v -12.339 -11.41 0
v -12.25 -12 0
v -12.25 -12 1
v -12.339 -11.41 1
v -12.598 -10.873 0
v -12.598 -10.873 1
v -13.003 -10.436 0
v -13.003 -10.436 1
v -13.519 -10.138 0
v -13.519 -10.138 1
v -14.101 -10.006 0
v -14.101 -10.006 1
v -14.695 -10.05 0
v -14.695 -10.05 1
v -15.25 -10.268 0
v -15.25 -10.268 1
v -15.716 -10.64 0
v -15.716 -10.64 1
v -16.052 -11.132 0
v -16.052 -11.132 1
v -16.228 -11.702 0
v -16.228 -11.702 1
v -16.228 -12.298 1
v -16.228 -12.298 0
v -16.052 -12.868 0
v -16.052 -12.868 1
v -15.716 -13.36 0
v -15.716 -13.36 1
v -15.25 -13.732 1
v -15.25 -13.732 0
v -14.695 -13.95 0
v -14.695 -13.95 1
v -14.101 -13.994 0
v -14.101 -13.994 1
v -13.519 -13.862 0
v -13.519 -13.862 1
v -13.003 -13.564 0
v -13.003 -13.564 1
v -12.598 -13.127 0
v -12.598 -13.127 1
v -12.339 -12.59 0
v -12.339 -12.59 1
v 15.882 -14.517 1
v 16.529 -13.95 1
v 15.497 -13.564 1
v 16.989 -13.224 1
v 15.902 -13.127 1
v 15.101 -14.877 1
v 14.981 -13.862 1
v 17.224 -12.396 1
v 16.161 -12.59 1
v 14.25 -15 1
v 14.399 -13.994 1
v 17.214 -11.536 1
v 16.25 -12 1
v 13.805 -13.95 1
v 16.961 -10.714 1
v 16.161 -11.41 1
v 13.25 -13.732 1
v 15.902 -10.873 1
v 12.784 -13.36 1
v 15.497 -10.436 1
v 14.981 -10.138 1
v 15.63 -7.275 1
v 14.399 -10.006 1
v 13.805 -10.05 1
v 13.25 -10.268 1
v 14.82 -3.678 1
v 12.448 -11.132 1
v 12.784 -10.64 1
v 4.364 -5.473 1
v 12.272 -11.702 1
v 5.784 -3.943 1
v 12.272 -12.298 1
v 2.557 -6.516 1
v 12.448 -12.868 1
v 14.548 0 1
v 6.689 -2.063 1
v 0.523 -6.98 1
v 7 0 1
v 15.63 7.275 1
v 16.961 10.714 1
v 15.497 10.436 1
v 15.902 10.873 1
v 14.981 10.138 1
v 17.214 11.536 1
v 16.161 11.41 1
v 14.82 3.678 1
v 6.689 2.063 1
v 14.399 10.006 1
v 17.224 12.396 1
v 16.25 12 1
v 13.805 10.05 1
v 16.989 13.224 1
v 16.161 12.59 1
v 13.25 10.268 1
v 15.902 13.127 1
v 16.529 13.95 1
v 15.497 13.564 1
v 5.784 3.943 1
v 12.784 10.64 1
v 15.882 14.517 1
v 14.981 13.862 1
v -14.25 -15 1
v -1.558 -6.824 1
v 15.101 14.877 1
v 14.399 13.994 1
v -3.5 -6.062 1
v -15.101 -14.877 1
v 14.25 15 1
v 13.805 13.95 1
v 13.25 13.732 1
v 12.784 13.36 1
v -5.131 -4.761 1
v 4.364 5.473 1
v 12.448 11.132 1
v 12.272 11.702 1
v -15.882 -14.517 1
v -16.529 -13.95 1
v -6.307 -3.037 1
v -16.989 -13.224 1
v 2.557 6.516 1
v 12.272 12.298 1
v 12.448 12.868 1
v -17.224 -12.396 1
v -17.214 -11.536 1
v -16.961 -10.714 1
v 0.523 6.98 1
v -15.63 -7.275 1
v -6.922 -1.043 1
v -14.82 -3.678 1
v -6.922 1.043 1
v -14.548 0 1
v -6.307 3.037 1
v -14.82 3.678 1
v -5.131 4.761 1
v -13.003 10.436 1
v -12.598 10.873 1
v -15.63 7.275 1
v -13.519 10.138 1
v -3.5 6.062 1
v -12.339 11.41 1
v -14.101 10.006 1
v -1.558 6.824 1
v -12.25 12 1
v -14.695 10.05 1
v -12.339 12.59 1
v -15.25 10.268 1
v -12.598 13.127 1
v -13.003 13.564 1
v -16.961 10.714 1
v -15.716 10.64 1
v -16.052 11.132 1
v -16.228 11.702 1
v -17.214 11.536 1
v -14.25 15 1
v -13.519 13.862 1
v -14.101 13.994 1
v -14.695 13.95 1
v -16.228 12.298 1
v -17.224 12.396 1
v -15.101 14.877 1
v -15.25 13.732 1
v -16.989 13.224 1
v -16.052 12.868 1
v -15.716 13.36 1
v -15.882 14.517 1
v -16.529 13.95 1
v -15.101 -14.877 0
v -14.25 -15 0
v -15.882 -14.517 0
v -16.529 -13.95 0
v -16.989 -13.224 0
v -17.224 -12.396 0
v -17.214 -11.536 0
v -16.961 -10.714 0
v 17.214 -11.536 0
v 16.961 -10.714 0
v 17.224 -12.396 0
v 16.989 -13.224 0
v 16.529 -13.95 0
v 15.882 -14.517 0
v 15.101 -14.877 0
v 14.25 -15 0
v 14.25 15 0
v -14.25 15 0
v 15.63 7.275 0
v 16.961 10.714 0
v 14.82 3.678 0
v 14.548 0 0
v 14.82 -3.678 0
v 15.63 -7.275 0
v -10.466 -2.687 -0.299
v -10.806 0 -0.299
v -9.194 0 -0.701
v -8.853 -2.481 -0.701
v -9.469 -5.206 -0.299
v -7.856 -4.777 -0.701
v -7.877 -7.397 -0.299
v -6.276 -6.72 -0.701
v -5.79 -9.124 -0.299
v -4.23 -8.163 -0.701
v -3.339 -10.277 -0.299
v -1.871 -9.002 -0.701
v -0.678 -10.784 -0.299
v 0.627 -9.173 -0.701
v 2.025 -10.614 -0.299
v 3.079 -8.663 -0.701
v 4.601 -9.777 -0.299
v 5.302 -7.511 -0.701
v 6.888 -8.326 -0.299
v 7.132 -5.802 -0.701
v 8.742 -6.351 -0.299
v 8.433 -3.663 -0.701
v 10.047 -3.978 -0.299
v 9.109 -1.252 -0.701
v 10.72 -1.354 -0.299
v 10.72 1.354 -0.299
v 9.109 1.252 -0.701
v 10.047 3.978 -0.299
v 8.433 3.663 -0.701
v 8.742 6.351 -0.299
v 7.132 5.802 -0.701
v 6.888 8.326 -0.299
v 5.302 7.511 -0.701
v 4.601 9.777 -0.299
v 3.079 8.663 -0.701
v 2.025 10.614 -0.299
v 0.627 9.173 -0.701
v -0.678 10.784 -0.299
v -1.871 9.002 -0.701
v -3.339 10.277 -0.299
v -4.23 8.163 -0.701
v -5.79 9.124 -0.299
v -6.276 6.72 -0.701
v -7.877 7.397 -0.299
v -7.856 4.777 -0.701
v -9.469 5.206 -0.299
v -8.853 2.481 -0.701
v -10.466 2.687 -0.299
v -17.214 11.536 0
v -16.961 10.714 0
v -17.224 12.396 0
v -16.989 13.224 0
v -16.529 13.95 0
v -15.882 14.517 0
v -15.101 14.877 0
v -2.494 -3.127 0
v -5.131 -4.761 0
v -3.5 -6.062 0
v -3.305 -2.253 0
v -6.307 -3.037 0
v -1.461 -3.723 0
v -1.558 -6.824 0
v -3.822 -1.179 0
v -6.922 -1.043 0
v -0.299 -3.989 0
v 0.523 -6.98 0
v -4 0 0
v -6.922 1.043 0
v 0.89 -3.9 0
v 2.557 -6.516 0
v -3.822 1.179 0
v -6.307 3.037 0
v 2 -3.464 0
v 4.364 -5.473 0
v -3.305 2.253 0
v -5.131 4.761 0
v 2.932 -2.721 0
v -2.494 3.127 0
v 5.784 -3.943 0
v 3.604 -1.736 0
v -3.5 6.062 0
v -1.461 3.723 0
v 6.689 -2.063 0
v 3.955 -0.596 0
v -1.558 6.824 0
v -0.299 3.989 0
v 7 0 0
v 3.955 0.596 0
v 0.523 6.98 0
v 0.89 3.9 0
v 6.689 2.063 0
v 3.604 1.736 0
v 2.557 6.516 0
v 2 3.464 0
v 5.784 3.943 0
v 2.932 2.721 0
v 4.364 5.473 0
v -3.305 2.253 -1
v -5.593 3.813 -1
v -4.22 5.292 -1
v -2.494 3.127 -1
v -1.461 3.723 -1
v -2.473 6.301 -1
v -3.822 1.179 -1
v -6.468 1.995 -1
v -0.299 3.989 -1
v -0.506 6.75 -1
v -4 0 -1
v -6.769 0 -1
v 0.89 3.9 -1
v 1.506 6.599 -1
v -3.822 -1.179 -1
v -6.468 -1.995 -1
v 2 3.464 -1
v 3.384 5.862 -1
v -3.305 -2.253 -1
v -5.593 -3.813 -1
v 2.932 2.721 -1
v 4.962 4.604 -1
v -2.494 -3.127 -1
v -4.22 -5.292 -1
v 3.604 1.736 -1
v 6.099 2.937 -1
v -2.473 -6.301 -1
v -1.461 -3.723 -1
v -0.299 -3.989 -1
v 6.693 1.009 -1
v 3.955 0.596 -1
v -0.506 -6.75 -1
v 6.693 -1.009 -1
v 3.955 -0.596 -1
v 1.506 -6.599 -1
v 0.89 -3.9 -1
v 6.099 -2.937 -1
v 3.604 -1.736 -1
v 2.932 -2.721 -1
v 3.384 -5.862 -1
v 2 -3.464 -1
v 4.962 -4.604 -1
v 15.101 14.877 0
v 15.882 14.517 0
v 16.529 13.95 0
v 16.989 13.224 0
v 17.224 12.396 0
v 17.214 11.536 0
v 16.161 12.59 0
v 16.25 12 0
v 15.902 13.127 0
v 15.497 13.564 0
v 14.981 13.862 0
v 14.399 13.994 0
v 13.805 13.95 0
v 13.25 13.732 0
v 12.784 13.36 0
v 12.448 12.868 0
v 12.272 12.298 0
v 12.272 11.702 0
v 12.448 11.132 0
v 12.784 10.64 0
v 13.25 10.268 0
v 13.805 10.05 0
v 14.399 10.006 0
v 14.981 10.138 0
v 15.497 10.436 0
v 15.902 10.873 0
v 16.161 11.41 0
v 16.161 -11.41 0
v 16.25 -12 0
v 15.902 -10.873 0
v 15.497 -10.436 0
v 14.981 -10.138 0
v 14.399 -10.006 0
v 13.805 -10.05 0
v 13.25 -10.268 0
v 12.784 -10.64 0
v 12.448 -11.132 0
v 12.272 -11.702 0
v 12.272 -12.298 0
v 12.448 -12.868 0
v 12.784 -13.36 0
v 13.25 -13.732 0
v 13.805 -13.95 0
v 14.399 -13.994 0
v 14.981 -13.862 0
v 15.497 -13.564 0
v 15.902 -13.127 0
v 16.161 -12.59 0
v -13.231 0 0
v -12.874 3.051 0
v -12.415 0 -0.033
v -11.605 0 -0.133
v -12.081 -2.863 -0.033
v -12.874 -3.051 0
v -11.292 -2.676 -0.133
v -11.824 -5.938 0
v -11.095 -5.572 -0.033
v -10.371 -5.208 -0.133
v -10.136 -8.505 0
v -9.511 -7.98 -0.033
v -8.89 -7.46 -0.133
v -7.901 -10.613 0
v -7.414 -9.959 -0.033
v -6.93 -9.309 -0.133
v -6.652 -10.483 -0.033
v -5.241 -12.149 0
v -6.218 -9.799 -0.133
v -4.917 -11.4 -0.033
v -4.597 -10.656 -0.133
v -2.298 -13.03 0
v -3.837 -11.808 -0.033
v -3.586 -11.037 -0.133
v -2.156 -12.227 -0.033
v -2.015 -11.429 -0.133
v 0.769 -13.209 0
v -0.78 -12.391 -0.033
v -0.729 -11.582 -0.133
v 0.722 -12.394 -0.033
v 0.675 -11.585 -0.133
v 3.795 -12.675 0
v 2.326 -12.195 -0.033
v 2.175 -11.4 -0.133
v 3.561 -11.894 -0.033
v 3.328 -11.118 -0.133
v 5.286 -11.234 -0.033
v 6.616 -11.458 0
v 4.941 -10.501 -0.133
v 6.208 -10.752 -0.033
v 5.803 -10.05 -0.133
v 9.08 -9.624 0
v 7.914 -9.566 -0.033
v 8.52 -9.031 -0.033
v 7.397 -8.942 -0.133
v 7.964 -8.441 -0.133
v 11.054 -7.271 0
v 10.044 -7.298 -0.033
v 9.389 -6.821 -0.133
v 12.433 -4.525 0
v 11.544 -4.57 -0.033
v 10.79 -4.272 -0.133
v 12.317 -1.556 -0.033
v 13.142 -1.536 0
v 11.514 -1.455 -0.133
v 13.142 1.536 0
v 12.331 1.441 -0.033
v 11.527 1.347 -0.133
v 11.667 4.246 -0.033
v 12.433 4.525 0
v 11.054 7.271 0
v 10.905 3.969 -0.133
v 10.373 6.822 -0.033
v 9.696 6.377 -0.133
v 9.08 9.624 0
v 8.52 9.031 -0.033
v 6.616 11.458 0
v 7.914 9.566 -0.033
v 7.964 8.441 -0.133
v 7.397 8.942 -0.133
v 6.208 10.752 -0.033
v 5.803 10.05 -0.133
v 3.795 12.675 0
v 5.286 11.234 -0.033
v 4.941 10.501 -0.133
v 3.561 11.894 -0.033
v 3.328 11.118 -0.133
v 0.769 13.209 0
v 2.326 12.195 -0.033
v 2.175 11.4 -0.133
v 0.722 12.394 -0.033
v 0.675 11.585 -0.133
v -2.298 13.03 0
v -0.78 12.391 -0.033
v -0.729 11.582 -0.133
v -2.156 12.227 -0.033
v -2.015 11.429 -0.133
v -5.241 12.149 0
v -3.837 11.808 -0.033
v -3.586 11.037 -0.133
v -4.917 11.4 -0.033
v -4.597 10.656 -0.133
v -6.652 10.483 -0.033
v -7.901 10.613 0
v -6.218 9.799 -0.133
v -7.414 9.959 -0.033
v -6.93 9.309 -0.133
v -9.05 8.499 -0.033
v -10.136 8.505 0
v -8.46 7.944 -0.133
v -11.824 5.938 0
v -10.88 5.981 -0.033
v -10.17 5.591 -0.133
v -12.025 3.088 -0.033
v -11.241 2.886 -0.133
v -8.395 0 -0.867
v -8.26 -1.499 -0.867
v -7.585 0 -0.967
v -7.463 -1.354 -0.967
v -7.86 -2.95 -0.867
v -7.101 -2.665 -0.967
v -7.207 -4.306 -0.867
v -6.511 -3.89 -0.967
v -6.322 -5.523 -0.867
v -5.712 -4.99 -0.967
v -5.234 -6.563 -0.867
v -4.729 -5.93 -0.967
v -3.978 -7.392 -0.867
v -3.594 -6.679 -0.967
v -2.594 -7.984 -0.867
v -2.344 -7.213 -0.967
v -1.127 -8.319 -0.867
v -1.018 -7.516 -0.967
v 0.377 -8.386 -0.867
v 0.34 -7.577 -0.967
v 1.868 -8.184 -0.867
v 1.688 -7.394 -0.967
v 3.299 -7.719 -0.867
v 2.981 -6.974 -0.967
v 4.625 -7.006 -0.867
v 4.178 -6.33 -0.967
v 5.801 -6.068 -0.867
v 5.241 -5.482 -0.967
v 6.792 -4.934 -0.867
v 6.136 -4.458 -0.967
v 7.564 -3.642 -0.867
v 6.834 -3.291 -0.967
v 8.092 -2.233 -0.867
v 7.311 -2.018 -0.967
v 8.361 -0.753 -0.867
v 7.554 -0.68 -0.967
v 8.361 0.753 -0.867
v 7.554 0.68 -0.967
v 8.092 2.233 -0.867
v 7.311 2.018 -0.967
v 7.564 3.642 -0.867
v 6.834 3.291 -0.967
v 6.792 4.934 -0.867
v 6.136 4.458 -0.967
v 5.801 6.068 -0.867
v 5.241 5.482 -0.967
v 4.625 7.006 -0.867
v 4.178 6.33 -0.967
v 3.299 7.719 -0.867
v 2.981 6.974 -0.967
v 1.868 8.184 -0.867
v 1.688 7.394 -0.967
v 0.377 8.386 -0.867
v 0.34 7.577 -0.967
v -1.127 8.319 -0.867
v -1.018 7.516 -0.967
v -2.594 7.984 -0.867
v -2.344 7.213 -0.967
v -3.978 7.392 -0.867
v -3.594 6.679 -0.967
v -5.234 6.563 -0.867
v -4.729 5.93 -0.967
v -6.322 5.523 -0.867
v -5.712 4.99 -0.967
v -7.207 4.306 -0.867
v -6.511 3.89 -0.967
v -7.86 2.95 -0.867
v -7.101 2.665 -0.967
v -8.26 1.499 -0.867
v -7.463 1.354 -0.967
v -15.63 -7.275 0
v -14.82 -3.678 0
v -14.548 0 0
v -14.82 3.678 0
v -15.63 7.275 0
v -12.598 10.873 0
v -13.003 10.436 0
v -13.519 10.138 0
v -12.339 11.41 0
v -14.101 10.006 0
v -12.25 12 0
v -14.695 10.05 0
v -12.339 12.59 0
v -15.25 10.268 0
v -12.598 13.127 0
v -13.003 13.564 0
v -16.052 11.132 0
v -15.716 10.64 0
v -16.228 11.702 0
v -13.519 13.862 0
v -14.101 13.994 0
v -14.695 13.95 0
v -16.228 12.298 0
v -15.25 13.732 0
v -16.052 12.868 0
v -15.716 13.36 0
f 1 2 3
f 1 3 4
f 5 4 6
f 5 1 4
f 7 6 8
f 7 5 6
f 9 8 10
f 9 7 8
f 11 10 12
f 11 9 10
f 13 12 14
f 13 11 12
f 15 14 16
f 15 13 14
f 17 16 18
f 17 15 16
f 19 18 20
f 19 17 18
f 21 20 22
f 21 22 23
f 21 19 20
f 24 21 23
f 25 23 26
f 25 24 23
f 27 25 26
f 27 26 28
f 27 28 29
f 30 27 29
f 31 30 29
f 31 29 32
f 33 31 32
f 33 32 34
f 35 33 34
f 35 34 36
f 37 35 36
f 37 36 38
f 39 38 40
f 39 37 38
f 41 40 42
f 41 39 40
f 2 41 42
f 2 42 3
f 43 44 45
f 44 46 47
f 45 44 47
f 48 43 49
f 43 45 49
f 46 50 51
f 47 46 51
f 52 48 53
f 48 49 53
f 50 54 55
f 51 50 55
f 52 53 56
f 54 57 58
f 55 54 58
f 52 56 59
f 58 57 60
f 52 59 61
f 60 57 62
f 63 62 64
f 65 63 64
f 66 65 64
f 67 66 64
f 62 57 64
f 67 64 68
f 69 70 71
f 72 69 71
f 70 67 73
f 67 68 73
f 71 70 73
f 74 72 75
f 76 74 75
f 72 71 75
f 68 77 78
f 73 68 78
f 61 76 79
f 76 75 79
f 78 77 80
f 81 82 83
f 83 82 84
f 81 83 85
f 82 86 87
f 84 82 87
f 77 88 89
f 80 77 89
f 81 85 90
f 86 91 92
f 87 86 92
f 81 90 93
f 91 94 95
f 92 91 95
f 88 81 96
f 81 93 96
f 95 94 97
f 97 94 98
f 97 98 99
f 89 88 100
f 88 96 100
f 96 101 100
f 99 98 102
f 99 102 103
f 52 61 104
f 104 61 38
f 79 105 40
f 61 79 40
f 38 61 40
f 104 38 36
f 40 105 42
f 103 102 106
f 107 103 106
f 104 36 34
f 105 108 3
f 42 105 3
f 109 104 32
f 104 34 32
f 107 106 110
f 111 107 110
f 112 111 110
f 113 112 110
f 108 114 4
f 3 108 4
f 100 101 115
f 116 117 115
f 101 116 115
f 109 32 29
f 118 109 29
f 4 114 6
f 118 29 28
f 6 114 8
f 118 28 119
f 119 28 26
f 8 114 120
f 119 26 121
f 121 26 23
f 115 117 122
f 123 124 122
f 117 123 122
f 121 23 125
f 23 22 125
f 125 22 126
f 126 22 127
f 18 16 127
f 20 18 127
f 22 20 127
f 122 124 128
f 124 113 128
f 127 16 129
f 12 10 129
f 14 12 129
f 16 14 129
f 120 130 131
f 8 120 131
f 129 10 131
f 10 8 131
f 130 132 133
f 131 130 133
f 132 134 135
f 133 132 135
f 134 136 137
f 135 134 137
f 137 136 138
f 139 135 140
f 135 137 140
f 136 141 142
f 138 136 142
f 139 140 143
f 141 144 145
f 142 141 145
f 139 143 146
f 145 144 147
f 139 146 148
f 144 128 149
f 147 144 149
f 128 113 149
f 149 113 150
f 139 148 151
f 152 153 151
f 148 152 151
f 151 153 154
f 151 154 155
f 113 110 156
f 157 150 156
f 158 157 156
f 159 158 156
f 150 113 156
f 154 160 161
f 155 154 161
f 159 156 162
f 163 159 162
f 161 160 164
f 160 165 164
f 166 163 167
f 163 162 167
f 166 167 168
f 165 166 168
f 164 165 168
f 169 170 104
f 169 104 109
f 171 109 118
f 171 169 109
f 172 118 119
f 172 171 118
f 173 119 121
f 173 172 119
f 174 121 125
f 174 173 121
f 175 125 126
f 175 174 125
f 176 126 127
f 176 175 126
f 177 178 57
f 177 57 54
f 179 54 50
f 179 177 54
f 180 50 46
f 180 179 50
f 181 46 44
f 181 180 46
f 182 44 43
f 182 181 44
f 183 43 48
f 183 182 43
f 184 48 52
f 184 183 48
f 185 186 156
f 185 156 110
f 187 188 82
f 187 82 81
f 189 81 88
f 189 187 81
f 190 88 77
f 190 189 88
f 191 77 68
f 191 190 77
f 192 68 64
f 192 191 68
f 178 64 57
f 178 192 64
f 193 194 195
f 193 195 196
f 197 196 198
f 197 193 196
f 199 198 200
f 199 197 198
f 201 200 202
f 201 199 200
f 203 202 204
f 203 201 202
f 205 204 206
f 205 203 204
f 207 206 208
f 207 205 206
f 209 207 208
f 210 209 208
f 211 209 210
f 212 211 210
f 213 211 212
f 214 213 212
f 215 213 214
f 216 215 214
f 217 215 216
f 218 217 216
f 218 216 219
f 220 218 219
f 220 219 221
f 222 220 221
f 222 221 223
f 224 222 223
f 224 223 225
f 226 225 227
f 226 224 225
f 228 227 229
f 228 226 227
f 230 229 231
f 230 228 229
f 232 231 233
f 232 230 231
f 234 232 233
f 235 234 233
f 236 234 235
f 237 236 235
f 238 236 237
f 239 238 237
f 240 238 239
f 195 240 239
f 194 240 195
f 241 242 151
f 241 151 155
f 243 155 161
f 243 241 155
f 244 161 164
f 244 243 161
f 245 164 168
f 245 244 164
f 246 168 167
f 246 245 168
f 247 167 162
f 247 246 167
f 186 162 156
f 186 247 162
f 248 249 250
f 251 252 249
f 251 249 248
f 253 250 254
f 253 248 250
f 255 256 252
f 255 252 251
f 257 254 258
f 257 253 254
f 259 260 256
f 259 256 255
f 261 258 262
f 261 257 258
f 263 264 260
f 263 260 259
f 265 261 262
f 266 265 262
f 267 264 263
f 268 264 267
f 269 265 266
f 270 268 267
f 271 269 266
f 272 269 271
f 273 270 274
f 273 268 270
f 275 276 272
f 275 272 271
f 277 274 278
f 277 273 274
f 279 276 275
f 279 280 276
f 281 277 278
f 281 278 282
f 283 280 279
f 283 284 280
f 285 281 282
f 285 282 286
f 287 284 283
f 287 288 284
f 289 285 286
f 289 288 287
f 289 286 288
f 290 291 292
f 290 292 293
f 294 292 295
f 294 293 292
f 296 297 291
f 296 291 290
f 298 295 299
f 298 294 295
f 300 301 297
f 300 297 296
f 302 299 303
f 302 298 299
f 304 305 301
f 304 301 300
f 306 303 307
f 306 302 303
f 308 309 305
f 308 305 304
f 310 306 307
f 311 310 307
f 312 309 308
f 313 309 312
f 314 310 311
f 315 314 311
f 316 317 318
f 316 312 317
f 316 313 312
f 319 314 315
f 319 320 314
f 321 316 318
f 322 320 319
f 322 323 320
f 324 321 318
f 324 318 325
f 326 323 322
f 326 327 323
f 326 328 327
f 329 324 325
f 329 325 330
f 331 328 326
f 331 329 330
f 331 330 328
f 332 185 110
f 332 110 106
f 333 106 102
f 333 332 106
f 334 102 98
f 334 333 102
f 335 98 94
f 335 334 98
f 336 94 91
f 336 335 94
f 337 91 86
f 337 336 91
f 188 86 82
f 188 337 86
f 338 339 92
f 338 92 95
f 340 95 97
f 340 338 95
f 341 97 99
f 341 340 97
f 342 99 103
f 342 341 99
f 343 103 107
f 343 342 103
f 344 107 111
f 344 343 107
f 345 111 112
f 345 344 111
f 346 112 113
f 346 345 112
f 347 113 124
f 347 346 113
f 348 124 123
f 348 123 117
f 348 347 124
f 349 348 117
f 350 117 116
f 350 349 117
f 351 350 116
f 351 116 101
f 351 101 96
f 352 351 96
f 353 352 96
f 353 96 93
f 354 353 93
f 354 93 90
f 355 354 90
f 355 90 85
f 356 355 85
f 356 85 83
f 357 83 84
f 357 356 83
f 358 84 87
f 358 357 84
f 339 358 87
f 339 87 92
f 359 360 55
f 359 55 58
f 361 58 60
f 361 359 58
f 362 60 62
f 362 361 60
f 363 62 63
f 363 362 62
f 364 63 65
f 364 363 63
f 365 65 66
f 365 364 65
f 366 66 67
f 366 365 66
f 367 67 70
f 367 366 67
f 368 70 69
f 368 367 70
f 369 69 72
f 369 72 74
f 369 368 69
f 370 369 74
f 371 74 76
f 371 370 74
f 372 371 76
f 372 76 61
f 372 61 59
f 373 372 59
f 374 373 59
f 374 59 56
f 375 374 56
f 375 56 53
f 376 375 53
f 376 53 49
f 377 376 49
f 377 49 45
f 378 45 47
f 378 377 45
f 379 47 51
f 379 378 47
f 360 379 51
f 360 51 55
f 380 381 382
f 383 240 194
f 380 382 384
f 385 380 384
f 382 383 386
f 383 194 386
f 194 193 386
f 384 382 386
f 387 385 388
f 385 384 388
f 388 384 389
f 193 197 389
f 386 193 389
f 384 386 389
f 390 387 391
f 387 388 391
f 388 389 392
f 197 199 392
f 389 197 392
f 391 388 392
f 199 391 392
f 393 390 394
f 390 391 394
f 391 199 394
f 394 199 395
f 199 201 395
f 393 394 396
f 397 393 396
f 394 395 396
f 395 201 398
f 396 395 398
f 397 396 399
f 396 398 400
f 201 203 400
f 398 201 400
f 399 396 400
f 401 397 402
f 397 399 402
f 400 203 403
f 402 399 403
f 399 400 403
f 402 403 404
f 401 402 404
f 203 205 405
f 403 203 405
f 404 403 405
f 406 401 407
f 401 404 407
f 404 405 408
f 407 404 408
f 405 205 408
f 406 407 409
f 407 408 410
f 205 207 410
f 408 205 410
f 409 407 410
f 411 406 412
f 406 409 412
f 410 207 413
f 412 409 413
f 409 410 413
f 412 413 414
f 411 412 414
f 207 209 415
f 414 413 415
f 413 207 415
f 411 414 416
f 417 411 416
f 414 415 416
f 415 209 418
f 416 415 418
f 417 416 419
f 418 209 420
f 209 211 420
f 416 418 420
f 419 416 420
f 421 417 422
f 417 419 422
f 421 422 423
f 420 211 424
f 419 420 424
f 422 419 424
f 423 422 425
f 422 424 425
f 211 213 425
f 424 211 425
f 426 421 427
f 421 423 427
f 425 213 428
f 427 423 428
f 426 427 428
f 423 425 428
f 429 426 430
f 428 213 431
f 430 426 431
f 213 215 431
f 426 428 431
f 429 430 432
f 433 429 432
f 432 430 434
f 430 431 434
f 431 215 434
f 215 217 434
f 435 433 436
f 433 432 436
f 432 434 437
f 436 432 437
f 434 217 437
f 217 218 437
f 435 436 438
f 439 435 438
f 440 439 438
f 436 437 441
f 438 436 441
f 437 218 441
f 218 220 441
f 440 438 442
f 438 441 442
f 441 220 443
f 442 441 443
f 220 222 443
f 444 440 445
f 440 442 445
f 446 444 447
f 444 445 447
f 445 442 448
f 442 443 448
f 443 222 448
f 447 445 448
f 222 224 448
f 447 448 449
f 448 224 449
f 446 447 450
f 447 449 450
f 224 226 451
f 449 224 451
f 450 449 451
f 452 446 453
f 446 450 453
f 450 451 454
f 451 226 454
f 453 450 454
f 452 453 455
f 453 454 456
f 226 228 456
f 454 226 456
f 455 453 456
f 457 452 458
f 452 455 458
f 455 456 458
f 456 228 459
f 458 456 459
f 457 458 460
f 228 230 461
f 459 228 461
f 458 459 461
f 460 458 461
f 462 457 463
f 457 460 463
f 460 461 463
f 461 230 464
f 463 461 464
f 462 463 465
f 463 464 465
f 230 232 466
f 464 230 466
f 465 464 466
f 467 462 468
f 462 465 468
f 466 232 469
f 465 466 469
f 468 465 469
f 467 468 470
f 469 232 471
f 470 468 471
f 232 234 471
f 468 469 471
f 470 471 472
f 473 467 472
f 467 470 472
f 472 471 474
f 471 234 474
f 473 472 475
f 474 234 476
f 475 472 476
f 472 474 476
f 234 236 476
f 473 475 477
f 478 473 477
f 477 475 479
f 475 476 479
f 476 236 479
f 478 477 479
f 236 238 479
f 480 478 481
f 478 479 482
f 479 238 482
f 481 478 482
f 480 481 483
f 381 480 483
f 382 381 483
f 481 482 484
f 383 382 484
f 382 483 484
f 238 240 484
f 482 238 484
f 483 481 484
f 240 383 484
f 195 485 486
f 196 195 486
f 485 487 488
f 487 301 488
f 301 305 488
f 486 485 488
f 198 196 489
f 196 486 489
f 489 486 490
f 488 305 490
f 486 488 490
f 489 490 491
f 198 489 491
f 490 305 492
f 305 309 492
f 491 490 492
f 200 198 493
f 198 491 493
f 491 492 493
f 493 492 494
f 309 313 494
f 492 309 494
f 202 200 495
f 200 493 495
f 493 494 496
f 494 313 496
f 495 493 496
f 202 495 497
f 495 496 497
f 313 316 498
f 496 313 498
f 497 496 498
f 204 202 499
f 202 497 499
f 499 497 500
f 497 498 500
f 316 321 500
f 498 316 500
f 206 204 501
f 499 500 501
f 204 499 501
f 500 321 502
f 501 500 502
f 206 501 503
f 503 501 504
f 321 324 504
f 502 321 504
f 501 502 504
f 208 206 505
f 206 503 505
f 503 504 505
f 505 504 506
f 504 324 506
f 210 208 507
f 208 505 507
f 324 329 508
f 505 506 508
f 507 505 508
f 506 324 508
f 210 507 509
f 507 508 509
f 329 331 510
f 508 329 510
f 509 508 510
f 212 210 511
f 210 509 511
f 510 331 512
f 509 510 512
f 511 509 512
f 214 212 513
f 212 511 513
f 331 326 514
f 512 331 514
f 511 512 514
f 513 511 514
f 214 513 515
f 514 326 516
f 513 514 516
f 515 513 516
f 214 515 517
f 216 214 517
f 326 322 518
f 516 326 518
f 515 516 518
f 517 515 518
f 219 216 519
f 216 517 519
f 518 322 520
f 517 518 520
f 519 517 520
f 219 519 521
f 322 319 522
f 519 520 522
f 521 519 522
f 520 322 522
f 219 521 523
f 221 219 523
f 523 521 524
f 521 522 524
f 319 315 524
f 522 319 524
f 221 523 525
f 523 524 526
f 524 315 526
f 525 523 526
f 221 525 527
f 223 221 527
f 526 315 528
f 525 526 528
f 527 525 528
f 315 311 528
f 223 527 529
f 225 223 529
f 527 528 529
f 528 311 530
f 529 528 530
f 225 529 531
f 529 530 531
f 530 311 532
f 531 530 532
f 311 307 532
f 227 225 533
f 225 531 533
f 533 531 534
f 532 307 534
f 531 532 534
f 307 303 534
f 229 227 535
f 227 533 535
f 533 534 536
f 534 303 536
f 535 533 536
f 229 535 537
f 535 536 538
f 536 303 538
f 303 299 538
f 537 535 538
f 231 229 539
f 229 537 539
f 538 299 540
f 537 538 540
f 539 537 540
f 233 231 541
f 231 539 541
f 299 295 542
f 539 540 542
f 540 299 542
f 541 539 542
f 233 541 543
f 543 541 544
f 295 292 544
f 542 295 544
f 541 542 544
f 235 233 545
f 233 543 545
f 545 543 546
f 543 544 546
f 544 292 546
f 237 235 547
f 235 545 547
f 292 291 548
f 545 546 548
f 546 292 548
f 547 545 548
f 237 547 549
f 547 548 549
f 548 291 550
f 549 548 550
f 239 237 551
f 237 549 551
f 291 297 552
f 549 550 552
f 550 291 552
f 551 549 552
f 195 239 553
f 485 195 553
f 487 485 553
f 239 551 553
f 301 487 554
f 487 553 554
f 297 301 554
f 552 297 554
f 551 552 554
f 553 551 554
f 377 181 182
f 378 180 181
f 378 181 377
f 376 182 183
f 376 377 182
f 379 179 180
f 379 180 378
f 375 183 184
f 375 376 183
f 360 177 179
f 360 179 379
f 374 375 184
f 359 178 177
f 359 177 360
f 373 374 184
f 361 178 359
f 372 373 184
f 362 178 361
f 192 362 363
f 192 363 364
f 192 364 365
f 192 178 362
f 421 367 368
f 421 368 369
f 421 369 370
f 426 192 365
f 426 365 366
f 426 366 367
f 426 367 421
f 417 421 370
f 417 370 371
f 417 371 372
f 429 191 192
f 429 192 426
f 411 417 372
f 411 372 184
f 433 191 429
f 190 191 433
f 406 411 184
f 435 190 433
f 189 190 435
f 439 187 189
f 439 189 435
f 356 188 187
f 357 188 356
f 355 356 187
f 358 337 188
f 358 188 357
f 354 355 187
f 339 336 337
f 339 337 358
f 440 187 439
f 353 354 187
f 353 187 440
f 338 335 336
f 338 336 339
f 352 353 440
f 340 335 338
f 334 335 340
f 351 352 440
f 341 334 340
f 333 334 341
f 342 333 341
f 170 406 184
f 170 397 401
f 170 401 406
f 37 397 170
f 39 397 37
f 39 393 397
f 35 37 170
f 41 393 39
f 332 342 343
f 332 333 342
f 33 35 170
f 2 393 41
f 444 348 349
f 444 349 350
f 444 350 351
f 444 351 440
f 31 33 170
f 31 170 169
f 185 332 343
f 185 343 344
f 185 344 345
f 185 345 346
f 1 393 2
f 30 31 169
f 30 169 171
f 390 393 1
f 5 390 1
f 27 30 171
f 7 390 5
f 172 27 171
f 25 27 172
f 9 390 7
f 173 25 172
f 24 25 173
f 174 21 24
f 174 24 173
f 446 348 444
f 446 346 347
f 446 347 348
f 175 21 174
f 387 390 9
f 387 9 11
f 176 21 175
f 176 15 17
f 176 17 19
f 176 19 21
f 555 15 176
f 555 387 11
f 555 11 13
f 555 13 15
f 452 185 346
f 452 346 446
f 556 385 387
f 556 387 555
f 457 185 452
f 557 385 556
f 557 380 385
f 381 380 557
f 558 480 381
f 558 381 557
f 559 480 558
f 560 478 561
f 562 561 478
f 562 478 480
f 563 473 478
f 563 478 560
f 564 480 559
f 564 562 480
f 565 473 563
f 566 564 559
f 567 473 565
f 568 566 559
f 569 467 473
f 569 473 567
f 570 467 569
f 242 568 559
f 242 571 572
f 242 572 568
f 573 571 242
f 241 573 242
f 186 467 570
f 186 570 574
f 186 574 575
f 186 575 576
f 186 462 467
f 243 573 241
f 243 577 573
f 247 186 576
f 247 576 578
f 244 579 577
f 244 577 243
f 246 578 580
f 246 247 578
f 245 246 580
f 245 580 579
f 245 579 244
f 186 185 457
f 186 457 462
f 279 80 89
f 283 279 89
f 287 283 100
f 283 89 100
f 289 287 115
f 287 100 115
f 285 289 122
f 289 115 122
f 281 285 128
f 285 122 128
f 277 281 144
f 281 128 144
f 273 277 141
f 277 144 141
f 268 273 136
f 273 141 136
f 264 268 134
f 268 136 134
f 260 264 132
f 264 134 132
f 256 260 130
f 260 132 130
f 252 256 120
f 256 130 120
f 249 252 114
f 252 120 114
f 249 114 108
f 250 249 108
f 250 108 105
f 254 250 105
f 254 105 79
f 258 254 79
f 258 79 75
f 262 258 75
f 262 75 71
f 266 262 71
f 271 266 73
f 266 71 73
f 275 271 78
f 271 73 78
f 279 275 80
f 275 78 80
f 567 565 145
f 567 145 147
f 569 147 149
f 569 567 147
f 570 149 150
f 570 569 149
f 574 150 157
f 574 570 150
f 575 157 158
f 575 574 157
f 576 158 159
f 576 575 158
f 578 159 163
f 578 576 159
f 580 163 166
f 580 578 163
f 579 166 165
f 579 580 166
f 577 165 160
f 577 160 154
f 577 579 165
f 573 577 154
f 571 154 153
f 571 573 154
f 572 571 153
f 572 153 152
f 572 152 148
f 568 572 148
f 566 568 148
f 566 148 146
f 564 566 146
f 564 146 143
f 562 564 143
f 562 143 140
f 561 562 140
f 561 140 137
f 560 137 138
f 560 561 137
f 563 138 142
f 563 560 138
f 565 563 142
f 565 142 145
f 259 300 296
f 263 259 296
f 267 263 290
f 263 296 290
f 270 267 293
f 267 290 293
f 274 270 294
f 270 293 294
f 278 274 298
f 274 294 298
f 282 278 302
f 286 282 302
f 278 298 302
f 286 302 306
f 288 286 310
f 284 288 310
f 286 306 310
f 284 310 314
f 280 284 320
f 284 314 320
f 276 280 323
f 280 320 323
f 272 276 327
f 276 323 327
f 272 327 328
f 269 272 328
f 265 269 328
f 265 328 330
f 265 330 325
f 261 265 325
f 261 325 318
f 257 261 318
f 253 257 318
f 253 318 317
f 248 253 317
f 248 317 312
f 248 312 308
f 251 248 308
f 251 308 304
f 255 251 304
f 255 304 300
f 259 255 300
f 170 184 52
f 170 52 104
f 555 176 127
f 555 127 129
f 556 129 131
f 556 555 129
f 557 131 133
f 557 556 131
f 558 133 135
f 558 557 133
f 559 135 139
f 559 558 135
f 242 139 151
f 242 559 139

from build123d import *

# Parameters (mm, degrees)
SKETCH_2_R          = 2
EXTRUDE_1_DEPTH     = 1
FILLET_1_R          = 10
FILLET_2_R          = 10
SKETCH_4_R          = 4
CUT_EXTRUDE_1_DEPTH = 10
SKETCH_5_R          = 7
CUT_EXTRUDE_2_DEPTH = 1


with BuildPart() as part:
    # 草图2 → 凸台-拉伸1 (new body)
    with BuildSketch(Plane.XY):
        with BuildLine():
            Line((-14.25, 15), (14.25, 15))
            ThreePointArc((14.25, 15), (16.785462764, 13.603567451), (16.960523709, 10.714285714))
            ThreePointArc((16.960523709, 10.714285714), (14.548221281, 0), (16.960523709, -10.714285714))
            ThreePointArc((16.960523709, -10.714285714), (16.785462764, -13.603567451), (14.25, -15))
            Line((14.25, -15), (-14.25, -15))
            ThreePointArc((-14.25, -15), (-16.785462764, -13.603567451), (-16.960523709, -10.714285714))
            ThreePointArc((-16.960523709, -10.714285714), (-14.548221281, 0), (-16.960523709, 10.714285714))
            ThreePointArc((-16.960523709, 10.714285714), (-16.785462764, 13.603567451), (-14.25, 15))
        make_face()
        with Locations((14.25, 12)):
            Circle(SKETCH_2_R, mode=Mode.SUBTRACT)
        with Locations((-14.25, 12)):
            Circle(SKETCH_2_R, mode=Mode.SUBTRACT)
        with Locations((-14.25, -12)):
            Circle(SKETCH_2_R, mode=Mode.SUBTRACT)
        with Locations((14.25, -12)):
            Circle(SKETCH_2_R, mode=Mode.SUBTRACT)
    extrude(amount=EXTRUDE_1_DEPTH)

    # 草图3 → 旋转1 (revolve)
    with BuildSketch(Plane(origin=(0, 0, 0), x_dir=(1, 0, 0), z_dir=(0, 1, 0)), mode=Mode.PRIVATE) as revolve_1_sk:
        Polygon((0, 1), (8, 1), (12, 0), (0, 0), align=None)
    revolve(revolve_1_sk.sketch.rotate(Axis((0, 0, 0), (0, 0, 1)), 180), axis=Axis((0, 0, 0), (0, 0, 1)))

    # 圆角1
    fillet_1_edges = [part.edges().sort_by_distance(p)[0] for p in [
        (12, 0, 0),
    ]]
    fillet(fillet_1_edges, radius=FILLET_1_R)

    # 圆角2
    fillet_2_edges = [part.edges().sort_by_distance(p)[0] for p in [
        (8, 0, -1),
    ]]
    fillet(fillet_2_edges, radius=FILLET_2_R)

    # 草图4 → 切除-拉伸1 (cut)
    with BuildSketch(Plane(origin=(0, 0, -1), x_dir=(-1, 0, 0), z_dir=(0, 0, -1))):
        Circle(SKETCH_4_R)
    extrude(amount=-CUT_EXTRUDE_1_DEPTH, mode=Mode.SUBTRACT)

    # 草图5 → 切除-拉伸2 (cut)
    with BuildSketch(Plane.XY.offset(1)):
        Circle(SKETCH_5_R)
    extrude(amount=-CUT_EXTRUDE_2_DEPTH, mode=Mode.SUBTRACT)


solid = part.part
